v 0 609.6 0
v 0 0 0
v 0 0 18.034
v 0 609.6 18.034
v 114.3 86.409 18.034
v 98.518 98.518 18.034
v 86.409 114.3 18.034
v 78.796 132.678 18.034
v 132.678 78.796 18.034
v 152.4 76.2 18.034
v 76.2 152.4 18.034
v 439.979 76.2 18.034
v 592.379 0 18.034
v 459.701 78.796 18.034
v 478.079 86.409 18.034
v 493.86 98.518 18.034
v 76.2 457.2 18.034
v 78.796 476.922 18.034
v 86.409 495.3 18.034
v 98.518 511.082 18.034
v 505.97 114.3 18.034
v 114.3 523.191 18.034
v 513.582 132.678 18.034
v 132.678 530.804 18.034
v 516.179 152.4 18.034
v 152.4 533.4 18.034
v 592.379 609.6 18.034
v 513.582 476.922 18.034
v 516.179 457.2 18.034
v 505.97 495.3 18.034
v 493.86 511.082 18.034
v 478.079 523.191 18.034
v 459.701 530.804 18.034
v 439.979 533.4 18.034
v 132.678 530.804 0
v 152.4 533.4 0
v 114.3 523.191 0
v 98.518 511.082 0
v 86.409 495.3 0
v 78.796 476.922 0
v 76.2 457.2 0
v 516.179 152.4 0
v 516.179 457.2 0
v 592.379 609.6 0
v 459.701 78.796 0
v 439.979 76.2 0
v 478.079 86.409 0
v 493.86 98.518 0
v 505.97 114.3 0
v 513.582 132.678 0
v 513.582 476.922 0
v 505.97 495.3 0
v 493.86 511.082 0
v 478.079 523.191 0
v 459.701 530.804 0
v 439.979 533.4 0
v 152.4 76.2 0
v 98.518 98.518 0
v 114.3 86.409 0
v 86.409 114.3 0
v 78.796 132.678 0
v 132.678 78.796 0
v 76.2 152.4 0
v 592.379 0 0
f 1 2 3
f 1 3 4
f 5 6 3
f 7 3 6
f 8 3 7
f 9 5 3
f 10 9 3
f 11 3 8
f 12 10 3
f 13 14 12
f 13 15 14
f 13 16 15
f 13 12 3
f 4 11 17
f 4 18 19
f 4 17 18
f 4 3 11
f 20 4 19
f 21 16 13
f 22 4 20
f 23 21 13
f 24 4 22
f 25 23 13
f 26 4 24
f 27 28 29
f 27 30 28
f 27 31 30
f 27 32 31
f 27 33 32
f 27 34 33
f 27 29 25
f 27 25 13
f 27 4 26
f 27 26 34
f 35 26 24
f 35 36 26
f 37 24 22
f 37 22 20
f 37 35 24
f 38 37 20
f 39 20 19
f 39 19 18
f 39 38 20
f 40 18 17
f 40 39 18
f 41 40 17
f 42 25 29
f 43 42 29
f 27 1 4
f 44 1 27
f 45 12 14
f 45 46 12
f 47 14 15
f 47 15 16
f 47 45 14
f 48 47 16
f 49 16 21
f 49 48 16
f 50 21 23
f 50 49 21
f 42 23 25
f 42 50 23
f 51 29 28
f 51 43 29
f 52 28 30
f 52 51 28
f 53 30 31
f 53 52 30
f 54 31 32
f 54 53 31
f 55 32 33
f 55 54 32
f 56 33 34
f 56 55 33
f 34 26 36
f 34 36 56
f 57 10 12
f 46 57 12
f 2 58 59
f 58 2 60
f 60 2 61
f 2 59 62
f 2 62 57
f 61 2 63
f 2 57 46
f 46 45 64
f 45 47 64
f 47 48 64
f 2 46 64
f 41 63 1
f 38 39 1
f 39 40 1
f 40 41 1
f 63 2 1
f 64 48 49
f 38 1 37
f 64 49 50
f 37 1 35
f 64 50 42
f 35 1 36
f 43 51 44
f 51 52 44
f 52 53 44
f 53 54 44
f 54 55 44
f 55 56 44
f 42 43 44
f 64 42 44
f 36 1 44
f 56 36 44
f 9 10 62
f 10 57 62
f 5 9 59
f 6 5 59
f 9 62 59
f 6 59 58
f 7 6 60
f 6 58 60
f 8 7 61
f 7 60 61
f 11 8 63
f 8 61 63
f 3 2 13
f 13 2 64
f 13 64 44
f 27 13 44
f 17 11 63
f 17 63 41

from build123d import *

# Parameters (mm, degrees)
F0_W     = 592.3788
F0_H     = 609.6
F1_DEPTH = 18.034
F2_W     = 439.9788
F2_H     = 457.2
F3_DEPTH = 18.035
F4_R     = 76.2


with BuildPart() as f1:
    # F0 (on Top) → F1 (new body)
    with BuildSketch(Plane.XY):
        with Locations((296.1894, 304.8)):
            Rectangle(F0_W, F0_H)
    extrude(amount=F1_DEPTH)

    # F2 (on face) → F3 (cut, through all)
    with BuildSketch(Plane.XY.offset(18.034)):
        with Locations((296.1894, 304.8)):
            Rectangle(F2_W, F2_H)
    extrude(amount=-F3_DEPTH, mode=Mode.SUBTRACT)

    # F4
    f4_edges = [f1.edges().sort_by_distance(p)[0] for p in [
        (516.1788, 533.4, 9.017),
        (76.2, 533.4, 9.017),
        (76.2, 76.2, 9.017),
        (516.1788, 76.2, 9.017),
    ]]
    fillet(f4_edges, radius=F4_R)


solid = f1.part
